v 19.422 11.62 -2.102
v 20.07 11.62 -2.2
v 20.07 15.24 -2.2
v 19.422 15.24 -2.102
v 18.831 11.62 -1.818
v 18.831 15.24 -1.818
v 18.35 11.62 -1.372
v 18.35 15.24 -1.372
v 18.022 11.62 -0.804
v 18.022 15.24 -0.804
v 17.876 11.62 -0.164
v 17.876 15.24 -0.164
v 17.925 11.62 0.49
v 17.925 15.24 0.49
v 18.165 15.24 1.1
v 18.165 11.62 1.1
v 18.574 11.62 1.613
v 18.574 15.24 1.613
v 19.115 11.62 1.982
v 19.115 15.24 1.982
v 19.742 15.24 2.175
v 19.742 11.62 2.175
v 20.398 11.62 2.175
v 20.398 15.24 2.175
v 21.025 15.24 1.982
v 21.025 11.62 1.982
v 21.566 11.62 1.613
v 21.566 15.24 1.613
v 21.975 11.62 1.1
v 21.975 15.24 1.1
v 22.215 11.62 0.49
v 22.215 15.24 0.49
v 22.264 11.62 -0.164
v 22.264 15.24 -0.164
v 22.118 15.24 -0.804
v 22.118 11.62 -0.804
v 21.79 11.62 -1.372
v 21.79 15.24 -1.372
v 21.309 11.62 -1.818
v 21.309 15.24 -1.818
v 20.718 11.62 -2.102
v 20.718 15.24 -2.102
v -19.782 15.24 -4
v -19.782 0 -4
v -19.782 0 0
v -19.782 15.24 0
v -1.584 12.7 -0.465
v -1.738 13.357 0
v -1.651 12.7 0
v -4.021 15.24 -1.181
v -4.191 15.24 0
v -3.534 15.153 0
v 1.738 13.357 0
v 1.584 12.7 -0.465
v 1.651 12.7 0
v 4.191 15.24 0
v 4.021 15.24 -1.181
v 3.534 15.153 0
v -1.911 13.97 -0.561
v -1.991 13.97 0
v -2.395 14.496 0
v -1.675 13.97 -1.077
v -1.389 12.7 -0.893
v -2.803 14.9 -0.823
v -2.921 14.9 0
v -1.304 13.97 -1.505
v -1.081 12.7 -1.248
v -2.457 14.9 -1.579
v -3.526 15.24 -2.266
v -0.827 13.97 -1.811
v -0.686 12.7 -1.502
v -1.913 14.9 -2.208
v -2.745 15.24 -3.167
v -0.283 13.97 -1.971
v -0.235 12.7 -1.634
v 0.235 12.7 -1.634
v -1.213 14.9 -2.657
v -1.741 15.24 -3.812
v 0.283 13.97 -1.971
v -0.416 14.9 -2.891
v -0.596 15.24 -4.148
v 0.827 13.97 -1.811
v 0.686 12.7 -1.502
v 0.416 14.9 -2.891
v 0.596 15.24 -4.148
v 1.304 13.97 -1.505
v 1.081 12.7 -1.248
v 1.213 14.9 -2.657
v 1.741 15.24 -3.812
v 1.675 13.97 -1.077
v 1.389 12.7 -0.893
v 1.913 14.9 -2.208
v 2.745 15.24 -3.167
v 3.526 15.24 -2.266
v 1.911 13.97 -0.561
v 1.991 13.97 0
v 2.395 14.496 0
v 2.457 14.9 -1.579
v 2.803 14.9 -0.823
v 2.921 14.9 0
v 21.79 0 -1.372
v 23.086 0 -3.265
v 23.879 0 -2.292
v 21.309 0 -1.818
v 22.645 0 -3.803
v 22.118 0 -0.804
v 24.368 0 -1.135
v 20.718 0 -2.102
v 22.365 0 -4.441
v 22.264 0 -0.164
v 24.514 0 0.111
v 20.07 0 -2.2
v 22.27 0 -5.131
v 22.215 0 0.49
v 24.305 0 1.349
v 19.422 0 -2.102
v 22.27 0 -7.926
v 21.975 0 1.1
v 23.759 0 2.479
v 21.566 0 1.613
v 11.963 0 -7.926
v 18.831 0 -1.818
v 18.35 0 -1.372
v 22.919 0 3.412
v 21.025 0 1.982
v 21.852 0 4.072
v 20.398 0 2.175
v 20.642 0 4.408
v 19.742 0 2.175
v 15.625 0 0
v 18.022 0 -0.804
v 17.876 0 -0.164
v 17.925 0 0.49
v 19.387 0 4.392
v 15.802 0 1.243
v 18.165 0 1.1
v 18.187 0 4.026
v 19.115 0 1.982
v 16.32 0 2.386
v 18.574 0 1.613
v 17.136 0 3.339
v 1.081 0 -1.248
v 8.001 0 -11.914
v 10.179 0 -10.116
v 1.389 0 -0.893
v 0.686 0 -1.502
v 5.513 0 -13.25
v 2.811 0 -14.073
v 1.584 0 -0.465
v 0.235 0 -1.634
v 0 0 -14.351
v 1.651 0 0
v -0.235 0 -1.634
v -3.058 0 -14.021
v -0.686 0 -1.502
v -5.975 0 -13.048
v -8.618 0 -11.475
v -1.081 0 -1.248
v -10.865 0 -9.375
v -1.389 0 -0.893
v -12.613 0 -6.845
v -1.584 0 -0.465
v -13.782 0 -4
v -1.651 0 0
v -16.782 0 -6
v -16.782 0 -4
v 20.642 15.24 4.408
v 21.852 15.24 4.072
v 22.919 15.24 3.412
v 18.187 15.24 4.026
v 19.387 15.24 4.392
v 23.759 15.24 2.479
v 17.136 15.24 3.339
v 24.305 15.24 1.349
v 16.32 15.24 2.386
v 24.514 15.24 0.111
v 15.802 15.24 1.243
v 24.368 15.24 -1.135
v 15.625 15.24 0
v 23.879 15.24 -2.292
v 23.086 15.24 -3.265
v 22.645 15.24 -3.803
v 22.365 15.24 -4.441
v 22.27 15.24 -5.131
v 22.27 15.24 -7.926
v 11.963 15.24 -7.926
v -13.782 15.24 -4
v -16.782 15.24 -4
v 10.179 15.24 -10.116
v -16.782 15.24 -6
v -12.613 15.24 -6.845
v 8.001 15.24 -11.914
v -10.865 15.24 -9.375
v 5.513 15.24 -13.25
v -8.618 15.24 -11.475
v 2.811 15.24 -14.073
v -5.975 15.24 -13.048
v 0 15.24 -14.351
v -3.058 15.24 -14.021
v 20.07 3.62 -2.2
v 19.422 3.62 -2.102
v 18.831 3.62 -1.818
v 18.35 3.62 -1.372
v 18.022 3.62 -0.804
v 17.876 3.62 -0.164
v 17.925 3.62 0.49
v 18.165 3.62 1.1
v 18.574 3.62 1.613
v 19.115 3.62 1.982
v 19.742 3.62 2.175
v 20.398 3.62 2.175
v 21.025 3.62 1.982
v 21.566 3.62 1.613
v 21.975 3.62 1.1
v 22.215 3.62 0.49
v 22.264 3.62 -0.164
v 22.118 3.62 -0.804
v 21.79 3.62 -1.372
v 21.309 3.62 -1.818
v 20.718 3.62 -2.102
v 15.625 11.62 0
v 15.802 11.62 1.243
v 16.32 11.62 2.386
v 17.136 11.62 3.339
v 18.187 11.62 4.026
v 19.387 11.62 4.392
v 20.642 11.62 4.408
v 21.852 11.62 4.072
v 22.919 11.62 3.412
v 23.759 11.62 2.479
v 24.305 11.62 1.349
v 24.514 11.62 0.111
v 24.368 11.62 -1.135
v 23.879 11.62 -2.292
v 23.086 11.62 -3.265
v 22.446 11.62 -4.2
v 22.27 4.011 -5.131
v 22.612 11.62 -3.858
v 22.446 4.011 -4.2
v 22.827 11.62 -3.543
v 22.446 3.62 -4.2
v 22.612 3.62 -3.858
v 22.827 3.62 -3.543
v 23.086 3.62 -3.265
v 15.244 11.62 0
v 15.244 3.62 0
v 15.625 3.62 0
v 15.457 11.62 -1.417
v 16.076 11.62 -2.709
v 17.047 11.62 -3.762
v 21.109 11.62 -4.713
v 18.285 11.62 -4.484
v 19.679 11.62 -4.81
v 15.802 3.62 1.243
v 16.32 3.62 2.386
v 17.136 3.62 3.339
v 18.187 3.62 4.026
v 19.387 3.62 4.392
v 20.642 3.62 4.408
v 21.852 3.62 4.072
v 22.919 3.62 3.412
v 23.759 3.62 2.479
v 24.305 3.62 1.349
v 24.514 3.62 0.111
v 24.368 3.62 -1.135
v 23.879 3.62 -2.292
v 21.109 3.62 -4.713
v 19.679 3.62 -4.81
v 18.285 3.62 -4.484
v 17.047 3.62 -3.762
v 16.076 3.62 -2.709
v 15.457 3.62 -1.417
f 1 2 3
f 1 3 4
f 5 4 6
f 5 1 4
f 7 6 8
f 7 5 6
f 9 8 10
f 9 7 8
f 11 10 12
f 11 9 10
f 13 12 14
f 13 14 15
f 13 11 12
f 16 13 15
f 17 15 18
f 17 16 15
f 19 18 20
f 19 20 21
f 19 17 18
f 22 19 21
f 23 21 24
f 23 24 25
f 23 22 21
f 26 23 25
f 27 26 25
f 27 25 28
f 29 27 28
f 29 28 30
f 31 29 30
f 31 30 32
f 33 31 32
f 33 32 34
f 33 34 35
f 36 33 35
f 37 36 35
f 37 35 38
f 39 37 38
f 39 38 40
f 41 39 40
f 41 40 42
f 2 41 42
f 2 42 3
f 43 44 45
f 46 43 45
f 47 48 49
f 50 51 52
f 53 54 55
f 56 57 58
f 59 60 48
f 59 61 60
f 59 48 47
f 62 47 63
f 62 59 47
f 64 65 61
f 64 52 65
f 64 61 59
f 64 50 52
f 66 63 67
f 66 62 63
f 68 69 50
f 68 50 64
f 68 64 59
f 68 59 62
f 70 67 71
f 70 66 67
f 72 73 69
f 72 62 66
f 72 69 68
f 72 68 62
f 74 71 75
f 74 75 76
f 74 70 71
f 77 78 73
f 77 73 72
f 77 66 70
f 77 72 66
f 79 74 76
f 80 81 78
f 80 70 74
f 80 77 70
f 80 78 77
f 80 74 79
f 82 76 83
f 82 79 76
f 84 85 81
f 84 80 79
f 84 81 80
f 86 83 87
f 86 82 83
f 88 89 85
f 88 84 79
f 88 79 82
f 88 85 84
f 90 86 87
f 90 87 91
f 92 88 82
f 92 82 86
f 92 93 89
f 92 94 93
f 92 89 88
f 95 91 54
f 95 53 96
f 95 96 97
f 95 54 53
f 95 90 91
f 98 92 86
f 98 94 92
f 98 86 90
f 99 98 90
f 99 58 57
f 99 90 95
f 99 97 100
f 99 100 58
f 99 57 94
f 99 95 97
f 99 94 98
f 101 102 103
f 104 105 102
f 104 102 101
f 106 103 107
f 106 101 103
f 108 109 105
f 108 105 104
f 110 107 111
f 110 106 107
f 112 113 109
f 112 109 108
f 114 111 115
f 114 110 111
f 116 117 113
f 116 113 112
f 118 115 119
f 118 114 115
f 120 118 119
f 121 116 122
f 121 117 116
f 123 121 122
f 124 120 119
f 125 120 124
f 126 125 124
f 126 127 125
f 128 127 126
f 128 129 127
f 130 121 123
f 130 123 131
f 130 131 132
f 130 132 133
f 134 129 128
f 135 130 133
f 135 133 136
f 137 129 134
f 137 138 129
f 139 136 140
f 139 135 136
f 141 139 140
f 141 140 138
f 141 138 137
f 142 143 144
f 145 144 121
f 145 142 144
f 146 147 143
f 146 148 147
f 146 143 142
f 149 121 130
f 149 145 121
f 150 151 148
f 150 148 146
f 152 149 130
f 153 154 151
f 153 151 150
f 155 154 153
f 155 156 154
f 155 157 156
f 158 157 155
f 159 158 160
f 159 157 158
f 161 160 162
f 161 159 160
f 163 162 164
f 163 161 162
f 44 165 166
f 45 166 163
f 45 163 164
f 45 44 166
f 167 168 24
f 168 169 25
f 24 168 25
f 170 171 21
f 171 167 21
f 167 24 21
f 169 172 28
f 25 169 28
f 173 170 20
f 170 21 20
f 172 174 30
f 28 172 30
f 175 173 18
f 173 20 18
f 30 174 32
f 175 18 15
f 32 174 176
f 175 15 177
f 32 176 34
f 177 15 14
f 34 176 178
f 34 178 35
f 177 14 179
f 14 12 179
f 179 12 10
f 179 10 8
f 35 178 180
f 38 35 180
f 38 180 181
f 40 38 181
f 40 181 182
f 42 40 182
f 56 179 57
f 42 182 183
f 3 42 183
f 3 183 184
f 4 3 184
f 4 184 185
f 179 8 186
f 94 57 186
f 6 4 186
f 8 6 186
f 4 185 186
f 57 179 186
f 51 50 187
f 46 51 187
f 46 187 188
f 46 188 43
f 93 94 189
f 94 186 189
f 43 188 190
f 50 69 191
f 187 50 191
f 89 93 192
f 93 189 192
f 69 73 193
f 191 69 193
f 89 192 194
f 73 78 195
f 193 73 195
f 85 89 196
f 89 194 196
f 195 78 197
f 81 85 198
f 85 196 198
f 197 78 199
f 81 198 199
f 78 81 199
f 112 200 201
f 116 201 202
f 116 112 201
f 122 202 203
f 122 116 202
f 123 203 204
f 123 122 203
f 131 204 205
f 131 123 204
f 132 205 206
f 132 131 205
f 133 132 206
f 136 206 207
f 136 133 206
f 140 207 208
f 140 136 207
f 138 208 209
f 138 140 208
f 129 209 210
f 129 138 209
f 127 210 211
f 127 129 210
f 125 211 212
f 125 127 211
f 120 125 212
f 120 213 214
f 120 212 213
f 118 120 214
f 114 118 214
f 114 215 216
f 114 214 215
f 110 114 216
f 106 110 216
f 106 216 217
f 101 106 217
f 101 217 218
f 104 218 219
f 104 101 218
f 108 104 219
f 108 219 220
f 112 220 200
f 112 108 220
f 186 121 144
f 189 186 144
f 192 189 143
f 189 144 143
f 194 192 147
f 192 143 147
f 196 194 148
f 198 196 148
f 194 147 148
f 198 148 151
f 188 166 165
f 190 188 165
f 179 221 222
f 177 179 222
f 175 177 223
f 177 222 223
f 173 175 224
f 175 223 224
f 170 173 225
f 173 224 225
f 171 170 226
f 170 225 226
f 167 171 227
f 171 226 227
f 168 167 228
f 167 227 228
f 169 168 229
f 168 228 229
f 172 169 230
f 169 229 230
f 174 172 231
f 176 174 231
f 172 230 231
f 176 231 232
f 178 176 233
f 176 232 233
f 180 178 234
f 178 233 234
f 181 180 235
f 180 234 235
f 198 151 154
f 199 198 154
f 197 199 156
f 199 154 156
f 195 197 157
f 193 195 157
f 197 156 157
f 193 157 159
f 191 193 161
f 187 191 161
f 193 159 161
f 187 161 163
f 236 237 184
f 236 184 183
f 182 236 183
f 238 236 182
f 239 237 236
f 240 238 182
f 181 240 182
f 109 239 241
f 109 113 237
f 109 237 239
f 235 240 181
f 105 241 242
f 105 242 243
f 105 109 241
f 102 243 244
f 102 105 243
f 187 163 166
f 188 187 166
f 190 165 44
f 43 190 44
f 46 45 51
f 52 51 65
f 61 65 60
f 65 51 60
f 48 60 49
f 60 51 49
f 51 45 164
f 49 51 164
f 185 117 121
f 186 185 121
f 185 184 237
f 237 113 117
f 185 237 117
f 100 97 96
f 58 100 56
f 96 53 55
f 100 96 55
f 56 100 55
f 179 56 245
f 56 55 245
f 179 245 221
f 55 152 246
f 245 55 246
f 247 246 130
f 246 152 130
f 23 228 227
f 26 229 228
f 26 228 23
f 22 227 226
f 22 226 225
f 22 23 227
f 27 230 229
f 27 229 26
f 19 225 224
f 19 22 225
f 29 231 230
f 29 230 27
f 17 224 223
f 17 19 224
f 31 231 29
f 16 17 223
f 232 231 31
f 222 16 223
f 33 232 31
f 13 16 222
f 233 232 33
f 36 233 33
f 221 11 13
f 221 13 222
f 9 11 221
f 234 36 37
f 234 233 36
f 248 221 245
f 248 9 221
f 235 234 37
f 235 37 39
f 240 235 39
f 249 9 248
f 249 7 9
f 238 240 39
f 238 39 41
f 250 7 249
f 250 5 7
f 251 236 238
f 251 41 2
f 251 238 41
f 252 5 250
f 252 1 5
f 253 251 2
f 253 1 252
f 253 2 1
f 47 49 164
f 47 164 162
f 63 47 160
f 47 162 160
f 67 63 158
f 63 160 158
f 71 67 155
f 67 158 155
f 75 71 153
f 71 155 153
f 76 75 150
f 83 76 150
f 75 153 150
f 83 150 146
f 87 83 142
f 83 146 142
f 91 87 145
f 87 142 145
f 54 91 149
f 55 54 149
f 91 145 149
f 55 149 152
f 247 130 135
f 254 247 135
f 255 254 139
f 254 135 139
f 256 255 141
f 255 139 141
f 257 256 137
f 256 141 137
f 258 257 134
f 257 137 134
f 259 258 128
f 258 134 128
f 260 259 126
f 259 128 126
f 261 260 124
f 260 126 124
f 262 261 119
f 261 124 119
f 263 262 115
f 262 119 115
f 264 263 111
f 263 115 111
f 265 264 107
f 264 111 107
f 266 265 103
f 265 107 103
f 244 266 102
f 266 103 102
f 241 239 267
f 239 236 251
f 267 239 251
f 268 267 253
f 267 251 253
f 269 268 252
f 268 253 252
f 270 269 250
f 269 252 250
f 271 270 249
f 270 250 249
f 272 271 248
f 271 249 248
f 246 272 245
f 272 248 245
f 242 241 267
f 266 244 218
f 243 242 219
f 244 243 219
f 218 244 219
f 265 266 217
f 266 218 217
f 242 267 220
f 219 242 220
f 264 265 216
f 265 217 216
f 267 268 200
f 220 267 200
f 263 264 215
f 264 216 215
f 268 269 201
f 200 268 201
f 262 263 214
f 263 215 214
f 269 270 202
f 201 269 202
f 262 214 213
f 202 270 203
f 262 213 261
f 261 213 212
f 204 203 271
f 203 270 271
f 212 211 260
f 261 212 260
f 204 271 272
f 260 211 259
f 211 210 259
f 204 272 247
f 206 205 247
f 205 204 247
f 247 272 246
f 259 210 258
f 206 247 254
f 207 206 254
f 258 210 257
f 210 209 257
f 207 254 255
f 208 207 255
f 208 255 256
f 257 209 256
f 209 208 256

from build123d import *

# Parameters (mm, degrees)
SKETCH1_R           = 2.2
BOSS_EXTRUDE1_DEPTH = 15.24
SKETCH2_R           = 4.826
CUT_EXTRUDE1_DEPTH  = 4.0005
FILLET2_R           = 2.54
FILLET3_R           = 2.54


with BuildPart() as part:
    # Sketch1 → Boss-Extrude1 (new body)
    with BuildSketch(Plane(origin=(0, 0, 0), x_dir=(1, 0, 0), z_dir=(0, 1, 0))):
        with BuildLine():
            Line((-19.782278513, 0), (-13.782278513, 0))
            Line((-13.782278513, 0), (-1.651, 0))
            ThreePointArc((-1.651, 0), (0, 1.651), (1.651, 0))
            Line((1.651, 0), (15.625, 0))
            ThreePointArc((15.625, 0), (22.30372167, -3.84298224), (22.27, 3.862385921))
            Line((22.27, 3.862385921), (22.27, 7.926385921))
            Line((22.27, 7.926385921), (11.963427905, 7.926385921))
            ThreePointArc((11.963427905, 7.926385921), (6.7896847, 12.64323466), (0, 14.351))
            ThreePointArc((0, 14.351), (-8.618213301, 11.475086078), (-13.782278513, 4))
            Line((-13.782278513, 4), (-16.782278513, 4))
            Line((-16.782278513, 4), (-16.782278513, 6))
            Line((-16.782278513, 6), (-19.782278513, 4))
            Line((-19.782278513, 4), (-19.782278513, 0))
        make_face()
        with Locations(Location((20.07, 0, 0), (0, 0, 90))):
            Circle(SKETCH1_R, mode=Mode.SUBTRACT)
    extrude(amount=BOSS_EXTRUDE1_DEPTH)

    # Sketch2 → Cut-Extrude1 (cut, symmetric)
    with BuildSketch(Plane(origin=(0, 7.62, 0), x_dir=(1, 0, 0), z_dir=(0, 1, 0))):
        with Locations((20.07, 0)):
            Circle(SKETCH2_R)
    extrude(amount=CUT_EXTRUDE1_DEPTH, both=True, mode=Mode.SUBTRACT)

    # Fillet2
    fillet2_edges = [part.edges().sort_by_distance(p)[0] for p in [
        (0, 15.24, -1.651),
    ]]
    fillet(fillet2_edges, radius=FILLET2_R)

    # Fillet3
    # the kernel refuses this fillet: 2.54 mm, written as the material it adds along each edge
    with BuildSketch(Plane(origin=(22.27, 4.011467753, -3.862385921), x_dir=(0.8069614715901079, 0, 0.5906040834341796), z_dir=(0, 1, 0))) as fillet3_piece_1_section:
        with BuildLine():
            CenterArc((1.300694552, 2.523500349), FILLET3_R, 216.19988752, 47.265895784)
            Line((-0.748987586, 1.023365977), (-0.789981229, 0.993363289))
            Line((-0.789981229, 0.993363289), (-0.040993643, -0.030002687))
            Line((-0.040993643, -0.030002687), (0.005780865, -0.050470007))
            ThreePointArc((0.005780865, -0.050470007), (0.505825659, -0.02192561), (1.005870453, -0.050470007))
            Line((1.005870453, -0.050470007), (1.011651318, 0))
        make_face()
    fillet3_piece_1 = extrude(amount=11.228532247, mode=Mode.PRIVATE)
    fillet3_piece_1 = split(fillet3_piece_1, bisect_by=Plane(origin=(22.284641862, 11.6205, -4.588750924), z_dir=(0, -1, 0)), keep=Keep.TOP, mode=Mode.PRIVATE)
    fillet3_piece_1 = fillet3_piece_1 - Plane(origin=(20.07, 7.815983876, 0), x_dir=(1, 0, 0), z_dir=(0, 1, 0)) * Cylinder(4.826, 27, mode=Mode.PRIVATE)
    add(fillet3_piece_1)
    with BuildSketch(Plane(origin=(22.27, 11.6205, -3.862385921), x_dir=(0.8069614715901079, 0, 0.5906040834341796), z_dir=(0, 1, 0))) as fillet3_piece_2_section:
        with BuildLine():
            CenterArc((1.300694552, 2.523500349), FILLET3_R, 216.19988752, 47.265895784)
            Line((-0.748987586, 1.023365977), (-0.789981229, 0.993363289))
            Line((-0.789981229, 0.993363289), (-0.040993643, -0.030002687))
            Line((-0.040993643, -0.030002687), (0.005780865, -0.050470007))
            ThreePointArc((0.005780865, -0.050470007), (0.505825659, -0.02192561), (1.005870453, -0.050470007))
            Line((1.005870453, -0.050470007), (1.011651318, 0))
        make_face()
    fillet3_piece_2 = extrude(amount=3.6195, mode=Mode.PRIVATE)
    fillet3_piece_2 = fillet3_piece_2 & Plane(origin=(20.07, 13.43025, 0), x_dir=(1, 0, 0), z_dir=(0, 1, 0)) * Cylinder(4.826, 12, mode=Mode.PRIVATE)
    add(fillet3_piece_2)
    with BuildSketch(Plane(origin=(22.27, 11.6205, -3.862385921), x_dir=(0.8069614715901079, 0, 0.5906040834341796), z_dir=(0, 1, 0))) as fillet3_piece_3_section:
        with BuildLine():
            CenterArc((1.300694552, 2.523500349), FILLET3_R, 216.19988752, 47.265895784)
            Line((-0.748987586, 1.023365977), (-0.789981229, 0.993363289))
            Line((-0.789981229, 0.993363289), (-0.040993643, -0.030002687))
            Line((-0.040993643, -0.030002687), (0.005780865, -0.050470007))
            ThreePointArc((0.005780865, -0.050470007), (0.505825659, -0.02192561), (1.005870453, -0.050470007))
            Line((1.005870453, -0.050470007), (1.011651318, 0))
        make_face()
    fillet3_piece_3 = extrude(amount=3.6195, mode=Mode.PRIVATE)
    fillet3_piece_3 = fillet3_piece_3 - Plane(origin=(20.07, 13.43025, 0), x_dir=(1, 0, 0), z_dir=(0, 1, 0)) * Cylinder(4.826, 12, mode=Mode.PRIVATE)
    add(fillet3_piece_3)
    with BuildSketch(Plane(origin=(22.27, 0, -3.862385921), x_dir=(0, 0, -1), z_dir=(0, 1, 0))) as fillet3_piece_4_section:
        with BuildLine():
            CenterArc((1.268172041, -2.54), FILLET3_R, 90, 47.265895784)
            Line((-0.597485399, -0.816363636), (-0.634798548, -0.781890909))
            ThreePointArc((-0.634798548, -0.781890909), (-0.316435822, -0.395232463), (-0.044141553, 0.025142857))
            Line((-0.044141553, 0.025142857), (0, 0.0508))
            Line((0, 0.0508), (1.268172041, 0.0508))
            Line((1.268172041, 0.0508), (1.268172041, 0))
        make_face()
    fillet3_piece_4 = extrude(amount=3.6195, mode=Mode.PRIVATE)
    fillet3_piece_4 = fillet3_piece_4 - Plane(origin=(20.07, 1.80975, 0), x_dir=(1, 0, 0), z_dir=(0, 1, 0)) * Cylinder(4.826, 13, mode=Mode.PRIVATE)
    add(fillet3_piece_4)
    with BuildSketch(Plane(origin=(22.27, 0, -3.862385921), x_dir=(0, 0, -1), z_dir=(0, 1, 0))) as fillet3_piece_5_section:
        with BuildLine():
            CenterArc((1.268172041, -2.54), FILLET3_R, 90, 47.265895784)
            Line((-0.597485399, -0.816363636), (-0.634798548, -0.781890909))
            ThreePointArc((-0.634798548, -0.781890909), (-0.316435822, -0.395232463), (-0.044141553, 0.025142857))
            Line((-0.044141553, 0.025142857), (0, 0.0508))
            Line((0, 0.0508), (1.268172041, 0.0508))
            Line((1.268172041, 0.0508), (1.268172041, 0))
        make_face()
    fillet3_piece_5 = extrude(amount=3.6195, mode=Mode.PRIVATE)
    fillet3_piece_5 = fillet3_piece_5 & Plane(origin=(20.07, 1.80975, 0), x_dir=(1, 0, 0), z_dir=(0, 1, 0)) * Cylinder(4.826, 13, mode=Mode.PRIVATE)
    add(fillet3_piece_5)
    with BuildSketch(Plane(origin=(22.27, 0, -3.862385921), x_dir=(0, 0, -1), z_dir=(0, 1, 0))) as fillet3_piece_6_section:
        with BuildLine():
            CenterArc((1.268172041, -2.54), FILLET3_R, 90, 47.265895784)
            Line((-0.597485399, -0.816363636), (-0.634798548, -0.781890909))
            ThreePointArc((-0.634798548, -0.781890909), (-0.316435822, -0.395232463), (-0.044141553, 0.025142857))
            Line((-0.044141553, 0.025142857), (0, 0.0508))
            Line((0, 0.0508), (1.268172041, 0.0508))
            Line((1.268172041, 0.0508), (1.268172041, 0))
        make_face()
    fillet3_piece_6 = extrude(amount=11.228532247, mode=Mode.PRIVATE)
    fillet3_piece_6 = fillet3_piece_6 - Plane(origin=(20.07, 7.424016124, 0), x_dir=(1, 0, 0), z_dir=(0, 1, 0)) * Cylinder(4.826, 28, mode=Mode.PRIVATE)
    fillet3_piece_6 = split(fillet3_piece_6, bisect_by=Plane(origin=(22.284641862, 3.6195, -4.588750924), z_dir=(0, 1, 0)), keep=Keep.TOP, mode=Mode.PRIVATE)
    add(fillet3_piece_6)


solid = part.part
